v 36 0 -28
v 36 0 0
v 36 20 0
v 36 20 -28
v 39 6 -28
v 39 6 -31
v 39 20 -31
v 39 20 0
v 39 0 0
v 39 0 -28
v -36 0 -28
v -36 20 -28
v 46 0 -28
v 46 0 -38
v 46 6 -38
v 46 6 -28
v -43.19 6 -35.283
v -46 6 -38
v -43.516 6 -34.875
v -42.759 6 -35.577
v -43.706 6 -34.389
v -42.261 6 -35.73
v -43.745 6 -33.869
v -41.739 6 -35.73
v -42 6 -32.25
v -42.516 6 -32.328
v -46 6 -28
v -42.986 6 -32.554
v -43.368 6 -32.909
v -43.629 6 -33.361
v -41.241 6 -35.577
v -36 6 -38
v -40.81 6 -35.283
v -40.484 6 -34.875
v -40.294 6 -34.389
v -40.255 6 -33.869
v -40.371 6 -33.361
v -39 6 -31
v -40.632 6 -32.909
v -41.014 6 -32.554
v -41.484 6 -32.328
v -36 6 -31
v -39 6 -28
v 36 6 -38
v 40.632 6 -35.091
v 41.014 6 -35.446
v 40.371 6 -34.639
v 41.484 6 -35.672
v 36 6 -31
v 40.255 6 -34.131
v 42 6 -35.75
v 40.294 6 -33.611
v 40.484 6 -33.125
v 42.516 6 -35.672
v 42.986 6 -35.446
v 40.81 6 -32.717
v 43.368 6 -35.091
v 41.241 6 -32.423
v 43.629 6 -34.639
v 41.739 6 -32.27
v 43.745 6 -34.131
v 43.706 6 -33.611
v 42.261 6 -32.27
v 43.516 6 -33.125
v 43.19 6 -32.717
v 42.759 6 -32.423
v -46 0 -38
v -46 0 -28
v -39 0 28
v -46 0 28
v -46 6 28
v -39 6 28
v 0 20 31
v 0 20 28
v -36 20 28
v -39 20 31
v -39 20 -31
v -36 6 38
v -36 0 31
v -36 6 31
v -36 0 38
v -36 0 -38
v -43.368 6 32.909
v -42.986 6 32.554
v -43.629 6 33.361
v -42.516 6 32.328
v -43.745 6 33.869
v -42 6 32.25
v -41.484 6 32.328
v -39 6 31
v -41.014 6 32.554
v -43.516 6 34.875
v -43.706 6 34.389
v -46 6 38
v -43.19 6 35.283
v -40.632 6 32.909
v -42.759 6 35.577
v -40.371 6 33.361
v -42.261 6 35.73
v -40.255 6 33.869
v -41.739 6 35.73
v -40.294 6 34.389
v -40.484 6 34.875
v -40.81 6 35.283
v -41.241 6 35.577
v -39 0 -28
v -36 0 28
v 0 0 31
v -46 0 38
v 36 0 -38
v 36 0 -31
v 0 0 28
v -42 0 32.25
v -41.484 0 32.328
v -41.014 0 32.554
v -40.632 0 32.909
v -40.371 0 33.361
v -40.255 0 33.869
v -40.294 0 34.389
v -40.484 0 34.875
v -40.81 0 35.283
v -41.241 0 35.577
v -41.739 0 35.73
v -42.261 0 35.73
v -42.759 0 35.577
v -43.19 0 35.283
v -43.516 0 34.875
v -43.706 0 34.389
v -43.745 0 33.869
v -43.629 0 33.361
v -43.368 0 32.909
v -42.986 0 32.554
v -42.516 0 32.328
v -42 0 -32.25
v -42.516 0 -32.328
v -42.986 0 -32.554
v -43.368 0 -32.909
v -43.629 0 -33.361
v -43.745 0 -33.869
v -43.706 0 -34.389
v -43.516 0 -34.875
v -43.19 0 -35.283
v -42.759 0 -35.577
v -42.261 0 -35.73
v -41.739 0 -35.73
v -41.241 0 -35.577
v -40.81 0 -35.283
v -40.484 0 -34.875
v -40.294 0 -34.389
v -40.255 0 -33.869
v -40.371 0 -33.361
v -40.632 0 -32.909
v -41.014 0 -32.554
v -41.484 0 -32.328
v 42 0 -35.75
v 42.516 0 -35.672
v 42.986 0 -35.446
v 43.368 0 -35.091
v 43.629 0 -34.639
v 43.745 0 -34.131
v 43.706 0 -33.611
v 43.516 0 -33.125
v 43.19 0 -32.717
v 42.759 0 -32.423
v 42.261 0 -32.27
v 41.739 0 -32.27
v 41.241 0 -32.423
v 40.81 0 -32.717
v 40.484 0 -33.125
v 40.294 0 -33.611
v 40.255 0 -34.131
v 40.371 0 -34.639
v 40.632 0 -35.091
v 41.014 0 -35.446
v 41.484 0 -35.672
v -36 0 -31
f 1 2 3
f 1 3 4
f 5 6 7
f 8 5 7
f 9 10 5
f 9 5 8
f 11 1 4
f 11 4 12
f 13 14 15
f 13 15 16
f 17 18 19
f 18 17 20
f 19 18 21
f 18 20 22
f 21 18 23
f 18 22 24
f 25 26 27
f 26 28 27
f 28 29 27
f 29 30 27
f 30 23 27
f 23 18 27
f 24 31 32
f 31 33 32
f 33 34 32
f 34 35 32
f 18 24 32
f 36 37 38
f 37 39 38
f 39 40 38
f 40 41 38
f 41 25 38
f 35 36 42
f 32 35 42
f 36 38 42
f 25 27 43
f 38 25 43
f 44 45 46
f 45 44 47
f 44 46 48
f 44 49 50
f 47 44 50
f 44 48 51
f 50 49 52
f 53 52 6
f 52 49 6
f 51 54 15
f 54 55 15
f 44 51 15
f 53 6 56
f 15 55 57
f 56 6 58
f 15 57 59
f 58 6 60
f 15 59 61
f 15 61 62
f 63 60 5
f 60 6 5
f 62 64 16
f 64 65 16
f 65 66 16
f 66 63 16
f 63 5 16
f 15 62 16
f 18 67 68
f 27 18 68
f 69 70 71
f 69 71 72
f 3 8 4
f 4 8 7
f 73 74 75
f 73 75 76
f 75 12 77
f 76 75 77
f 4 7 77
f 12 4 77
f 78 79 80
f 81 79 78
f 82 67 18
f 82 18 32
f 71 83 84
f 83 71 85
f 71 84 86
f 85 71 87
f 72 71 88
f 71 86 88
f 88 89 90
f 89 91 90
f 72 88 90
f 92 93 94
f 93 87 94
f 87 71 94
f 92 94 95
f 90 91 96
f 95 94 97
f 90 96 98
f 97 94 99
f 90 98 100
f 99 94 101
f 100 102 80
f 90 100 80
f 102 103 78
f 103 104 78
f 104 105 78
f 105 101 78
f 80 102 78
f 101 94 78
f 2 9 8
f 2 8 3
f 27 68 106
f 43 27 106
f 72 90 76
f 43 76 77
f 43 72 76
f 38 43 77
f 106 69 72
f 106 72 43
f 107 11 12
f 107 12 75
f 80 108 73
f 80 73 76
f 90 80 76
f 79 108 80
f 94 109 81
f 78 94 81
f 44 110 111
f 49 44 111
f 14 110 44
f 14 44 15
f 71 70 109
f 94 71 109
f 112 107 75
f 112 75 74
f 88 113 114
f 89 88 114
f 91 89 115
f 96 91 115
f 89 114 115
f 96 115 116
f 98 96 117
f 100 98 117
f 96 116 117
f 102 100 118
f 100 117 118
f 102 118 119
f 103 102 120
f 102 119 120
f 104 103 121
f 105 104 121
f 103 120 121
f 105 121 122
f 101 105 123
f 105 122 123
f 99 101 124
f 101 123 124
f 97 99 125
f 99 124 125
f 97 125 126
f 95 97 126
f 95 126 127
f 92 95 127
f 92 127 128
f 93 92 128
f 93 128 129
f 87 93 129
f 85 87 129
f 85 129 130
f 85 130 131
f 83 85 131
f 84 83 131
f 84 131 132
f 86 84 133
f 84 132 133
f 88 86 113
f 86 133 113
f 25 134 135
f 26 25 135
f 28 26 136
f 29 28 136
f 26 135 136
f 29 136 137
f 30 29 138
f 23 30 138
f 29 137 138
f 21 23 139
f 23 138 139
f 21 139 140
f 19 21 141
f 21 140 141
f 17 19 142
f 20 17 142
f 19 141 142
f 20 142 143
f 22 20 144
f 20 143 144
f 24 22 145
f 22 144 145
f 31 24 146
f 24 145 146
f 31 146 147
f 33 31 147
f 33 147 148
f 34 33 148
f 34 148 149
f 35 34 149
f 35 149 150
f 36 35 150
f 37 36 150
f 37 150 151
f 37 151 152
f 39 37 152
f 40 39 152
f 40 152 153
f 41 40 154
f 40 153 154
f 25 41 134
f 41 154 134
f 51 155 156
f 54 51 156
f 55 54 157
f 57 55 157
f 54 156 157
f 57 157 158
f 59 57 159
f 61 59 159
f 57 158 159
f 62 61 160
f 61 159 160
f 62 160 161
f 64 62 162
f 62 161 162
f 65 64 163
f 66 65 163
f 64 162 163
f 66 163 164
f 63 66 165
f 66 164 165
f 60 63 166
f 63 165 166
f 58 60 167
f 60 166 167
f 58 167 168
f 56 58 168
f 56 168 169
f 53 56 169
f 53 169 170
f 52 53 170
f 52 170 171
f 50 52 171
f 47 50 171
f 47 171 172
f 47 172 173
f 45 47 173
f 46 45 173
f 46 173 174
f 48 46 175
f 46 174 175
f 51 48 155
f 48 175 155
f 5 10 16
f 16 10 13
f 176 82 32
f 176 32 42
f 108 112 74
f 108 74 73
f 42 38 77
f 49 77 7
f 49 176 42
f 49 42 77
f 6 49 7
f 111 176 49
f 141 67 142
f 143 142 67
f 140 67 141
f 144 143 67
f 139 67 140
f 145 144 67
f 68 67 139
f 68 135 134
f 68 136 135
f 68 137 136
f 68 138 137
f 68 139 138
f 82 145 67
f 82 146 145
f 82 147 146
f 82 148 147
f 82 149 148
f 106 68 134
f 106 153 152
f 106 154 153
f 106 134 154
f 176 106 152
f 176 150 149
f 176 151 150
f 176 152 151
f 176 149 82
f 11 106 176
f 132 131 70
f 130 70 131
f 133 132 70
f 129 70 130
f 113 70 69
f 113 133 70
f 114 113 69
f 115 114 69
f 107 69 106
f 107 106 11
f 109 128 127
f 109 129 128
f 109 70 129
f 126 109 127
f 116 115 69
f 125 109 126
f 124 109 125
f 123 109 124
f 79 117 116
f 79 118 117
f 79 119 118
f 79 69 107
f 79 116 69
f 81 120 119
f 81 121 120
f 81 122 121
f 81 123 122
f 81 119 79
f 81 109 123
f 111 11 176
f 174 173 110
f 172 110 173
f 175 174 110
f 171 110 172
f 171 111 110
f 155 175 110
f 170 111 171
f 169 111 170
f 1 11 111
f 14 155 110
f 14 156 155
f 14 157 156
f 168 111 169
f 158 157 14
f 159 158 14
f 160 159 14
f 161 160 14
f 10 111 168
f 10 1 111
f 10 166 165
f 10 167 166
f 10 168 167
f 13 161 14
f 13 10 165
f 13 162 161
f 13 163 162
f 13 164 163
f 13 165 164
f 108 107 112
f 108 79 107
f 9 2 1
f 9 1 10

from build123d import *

# Parameters (mm, degrees)
EXTRUDE_1_DEPTH = 20
SKETCH_2_W      = 10
SKETCH_2_H      = 10
SKETCH_2_R      = 1.75
EXTRUDE_2_DEPTH = 6


with BuildPart() as part:
    # 草图1 → 凸台-拉伸1 (new body)
    with BuildSketch(Plane(origin=(0, 0, 0), x_dir=(1, 0, 0), z_dir=(0, 1, 0))):
        Polygon((0, -28), (0, -31), (-39, -31), (-39, 31), (39, 31), (39, 0), (36, 0), (36, 28), (-36, 28), (-36, -28), align=None)
    extrude(amount=EXTRUDE_1_DEPTH)

    # 草图2 → 凸台-拉伸2 (add)
    # profile 1 of 3: a face of its own
    with BuildSketch(Plane.XZ):
        with Locations((-41, 33)):
            Rectangle(SKETCH_2_W, SKETCH_2_H)
        with Locations(Location((-42, 34, 0), (0, 0, 270))):
            Circle(SKETCH_2_R, mode=Mode.SUBTRACT)
    # profile 2 of 3: a face of its own
    with BuildSketch(Plane.XZ):
        with Locations((-41, -33)):
            Rectangle(SKETCH_2_W, SKETCH_2_H)
        with Locations(Location((-42, -34, 0), (0, 0, 90))):
            Circle(SKETCH_2_R, mode=Mode.SUBTRACT)
    # profile 3 of 3: a face of its own
    with BuildSketch(Plane.XZ):
        with Locations((41, -33)):
            Rectangle(SKETCH_2_W, SKETCH_2_H)
        with Locations(Location((42, -34, 0), (0, 0, 270))):
            Circle(SKETCH_2_R, mode=Mode.SUBTRACT)
    extrude(amount=-EXTRUDE_2_DEPTH)


solid = part.part
